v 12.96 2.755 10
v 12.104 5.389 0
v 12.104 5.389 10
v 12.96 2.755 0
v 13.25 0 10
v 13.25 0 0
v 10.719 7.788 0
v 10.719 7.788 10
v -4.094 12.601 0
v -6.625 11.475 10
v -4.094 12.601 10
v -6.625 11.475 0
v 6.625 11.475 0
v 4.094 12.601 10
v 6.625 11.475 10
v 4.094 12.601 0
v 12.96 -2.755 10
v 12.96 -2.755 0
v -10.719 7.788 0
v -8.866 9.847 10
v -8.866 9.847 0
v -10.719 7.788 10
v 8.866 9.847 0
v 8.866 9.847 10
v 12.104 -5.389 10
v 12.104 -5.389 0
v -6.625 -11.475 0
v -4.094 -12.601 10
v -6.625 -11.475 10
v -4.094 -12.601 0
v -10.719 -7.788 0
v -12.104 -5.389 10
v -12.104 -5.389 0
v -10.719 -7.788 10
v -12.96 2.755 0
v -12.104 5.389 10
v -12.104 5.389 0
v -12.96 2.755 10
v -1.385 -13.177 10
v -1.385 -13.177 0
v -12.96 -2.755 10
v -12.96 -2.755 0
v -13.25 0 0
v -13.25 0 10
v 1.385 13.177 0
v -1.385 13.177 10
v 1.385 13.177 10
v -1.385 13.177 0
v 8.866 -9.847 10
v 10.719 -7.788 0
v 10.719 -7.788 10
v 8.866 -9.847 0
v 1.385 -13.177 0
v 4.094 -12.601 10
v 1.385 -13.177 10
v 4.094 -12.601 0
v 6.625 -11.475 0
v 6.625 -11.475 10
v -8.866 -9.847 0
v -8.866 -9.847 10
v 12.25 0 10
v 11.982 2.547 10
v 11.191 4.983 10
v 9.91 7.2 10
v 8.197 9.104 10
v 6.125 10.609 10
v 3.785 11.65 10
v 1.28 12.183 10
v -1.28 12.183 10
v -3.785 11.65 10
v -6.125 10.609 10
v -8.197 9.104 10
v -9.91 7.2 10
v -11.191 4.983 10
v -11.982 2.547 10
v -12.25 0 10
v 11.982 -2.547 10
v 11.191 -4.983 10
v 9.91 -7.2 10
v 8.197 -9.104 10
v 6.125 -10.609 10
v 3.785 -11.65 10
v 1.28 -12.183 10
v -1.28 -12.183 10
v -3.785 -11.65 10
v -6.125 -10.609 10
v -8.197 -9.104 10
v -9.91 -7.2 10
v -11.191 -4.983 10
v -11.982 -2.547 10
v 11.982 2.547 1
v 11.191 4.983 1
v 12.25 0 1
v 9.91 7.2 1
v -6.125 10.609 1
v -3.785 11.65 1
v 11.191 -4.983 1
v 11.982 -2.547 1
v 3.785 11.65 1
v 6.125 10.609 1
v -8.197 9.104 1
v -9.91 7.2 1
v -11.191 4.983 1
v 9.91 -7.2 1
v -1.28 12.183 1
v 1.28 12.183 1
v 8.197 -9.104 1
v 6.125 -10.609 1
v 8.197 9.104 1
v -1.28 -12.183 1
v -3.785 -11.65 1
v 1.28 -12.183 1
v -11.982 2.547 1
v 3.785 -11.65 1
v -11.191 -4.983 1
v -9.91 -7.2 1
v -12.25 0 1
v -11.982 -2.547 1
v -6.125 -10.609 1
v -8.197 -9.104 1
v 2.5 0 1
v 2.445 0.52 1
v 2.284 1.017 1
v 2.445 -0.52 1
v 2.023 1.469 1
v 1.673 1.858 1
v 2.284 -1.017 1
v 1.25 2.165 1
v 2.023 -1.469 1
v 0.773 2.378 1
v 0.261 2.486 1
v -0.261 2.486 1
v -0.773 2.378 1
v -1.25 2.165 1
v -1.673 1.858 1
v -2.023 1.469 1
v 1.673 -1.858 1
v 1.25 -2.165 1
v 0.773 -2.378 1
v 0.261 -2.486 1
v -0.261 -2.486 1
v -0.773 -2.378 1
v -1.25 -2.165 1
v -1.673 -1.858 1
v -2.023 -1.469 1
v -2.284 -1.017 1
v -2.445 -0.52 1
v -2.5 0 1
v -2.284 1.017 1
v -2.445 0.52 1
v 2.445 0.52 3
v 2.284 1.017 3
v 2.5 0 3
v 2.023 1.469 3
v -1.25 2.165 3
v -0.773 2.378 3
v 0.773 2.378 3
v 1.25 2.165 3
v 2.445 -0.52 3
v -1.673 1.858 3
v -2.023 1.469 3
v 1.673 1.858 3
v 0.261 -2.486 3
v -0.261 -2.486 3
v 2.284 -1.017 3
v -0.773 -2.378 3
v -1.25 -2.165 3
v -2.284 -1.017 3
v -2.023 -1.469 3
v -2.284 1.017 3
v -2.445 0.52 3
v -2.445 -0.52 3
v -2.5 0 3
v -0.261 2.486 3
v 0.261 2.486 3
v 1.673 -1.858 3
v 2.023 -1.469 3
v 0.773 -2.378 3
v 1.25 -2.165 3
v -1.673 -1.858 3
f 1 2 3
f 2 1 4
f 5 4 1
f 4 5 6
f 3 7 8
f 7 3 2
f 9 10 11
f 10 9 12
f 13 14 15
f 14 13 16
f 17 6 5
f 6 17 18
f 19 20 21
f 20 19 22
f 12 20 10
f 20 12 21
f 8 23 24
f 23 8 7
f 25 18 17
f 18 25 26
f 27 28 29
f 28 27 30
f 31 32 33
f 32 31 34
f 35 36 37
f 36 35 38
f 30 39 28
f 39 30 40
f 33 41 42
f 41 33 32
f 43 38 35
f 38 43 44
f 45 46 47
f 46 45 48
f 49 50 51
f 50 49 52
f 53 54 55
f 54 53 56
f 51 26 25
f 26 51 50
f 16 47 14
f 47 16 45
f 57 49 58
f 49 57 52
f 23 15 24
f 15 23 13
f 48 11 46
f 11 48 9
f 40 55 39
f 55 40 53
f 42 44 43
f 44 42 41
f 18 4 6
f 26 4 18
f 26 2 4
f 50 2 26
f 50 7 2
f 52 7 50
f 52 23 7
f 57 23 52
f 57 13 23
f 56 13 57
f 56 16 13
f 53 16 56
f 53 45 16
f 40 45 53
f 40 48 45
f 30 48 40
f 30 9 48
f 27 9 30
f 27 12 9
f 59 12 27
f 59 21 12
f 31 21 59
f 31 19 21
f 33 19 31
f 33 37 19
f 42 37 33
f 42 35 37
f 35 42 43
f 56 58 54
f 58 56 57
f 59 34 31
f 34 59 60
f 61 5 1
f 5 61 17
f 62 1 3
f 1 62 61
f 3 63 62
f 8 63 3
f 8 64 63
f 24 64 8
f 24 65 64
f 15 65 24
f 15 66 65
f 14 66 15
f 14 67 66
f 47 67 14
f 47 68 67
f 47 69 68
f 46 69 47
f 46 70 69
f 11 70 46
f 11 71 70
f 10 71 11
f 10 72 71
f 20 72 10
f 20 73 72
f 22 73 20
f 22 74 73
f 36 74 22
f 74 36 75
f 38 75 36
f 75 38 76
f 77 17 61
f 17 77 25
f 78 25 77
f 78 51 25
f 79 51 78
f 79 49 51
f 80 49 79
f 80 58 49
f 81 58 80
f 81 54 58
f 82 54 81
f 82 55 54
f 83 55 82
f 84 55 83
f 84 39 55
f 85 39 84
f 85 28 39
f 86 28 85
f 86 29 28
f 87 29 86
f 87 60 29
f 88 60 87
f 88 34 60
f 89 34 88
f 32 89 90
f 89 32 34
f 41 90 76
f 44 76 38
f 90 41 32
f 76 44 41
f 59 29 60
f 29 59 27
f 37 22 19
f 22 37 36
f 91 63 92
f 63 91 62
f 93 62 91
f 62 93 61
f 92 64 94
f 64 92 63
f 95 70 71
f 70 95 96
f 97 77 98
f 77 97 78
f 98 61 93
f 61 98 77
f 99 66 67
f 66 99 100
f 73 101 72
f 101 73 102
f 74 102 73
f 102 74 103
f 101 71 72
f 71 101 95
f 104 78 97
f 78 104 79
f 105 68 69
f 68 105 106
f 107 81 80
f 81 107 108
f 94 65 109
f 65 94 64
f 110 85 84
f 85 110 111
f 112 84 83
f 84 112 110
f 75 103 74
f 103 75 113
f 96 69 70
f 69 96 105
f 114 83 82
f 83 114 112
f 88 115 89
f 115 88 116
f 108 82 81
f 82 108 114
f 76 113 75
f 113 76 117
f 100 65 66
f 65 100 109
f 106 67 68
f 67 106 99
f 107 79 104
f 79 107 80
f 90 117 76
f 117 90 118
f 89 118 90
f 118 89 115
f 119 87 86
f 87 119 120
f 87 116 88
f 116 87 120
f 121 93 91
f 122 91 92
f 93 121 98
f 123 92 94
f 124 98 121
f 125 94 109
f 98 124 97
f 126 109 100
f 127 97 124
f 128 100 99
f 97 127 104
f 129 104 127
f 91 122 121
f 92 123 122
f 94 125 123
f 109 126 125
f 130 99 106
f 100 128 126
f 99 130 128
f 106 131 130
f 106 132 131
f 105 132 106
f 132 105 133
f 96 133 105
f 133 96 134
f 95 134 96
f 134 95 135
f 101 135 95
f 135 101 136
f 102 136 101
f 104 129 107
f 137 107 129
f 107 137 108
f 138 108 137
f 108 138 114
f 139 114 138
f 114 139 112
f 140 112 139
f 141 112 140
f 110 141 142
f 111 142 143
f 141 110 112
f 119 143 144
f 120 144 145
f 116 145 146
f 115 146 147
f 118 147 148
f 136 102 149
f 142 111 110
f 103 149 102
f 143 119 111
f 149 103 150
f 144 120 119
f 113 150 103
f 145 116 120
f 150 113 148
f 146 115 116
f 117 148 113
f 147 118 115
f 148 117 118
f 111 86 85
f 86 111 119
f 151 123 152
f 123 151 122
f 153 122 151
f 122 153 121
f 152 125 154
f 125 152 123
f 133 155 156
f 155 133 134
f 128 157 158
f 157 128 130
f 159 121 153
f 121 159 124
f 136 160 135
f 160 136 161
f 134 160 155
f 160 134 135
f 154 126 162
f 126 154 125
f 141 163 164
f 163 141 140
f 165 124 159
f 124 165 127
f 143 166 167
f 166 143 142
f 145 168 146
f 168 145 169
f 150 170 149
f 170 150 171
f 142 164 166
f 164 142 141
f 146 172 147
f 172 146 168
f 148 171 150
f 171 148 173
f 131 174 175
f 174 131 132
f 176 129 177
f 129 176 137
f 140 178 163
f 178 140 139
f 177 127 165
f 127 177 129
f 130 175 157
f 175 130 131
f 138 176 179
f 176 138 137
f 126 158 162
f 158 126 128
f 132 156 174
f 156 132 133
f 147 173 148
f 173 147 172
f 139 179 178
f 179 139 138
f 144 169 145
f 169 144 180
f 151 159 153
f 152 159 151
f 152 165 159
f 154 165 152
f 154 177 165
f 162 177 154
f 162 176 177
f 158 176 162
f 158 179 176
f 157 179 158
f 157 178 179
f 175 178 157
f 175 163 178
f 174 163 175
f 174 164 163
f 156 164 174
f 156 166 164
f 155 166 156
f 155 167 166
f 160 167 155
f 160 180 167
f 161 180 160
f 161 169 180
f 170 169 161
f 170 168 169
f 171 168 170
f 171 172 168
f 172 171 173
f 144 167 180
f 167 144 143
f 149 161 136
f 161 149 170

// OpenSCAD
$fn=30;
module JGY_370motor(mode = "model"){
  //OTHER names: worm gear motor
  //46mm motor
  //all measurements in mm
  gearboxWidth = 46;
  gearboxHeigth = 32;
  gearboxDepth = 22.5;
  motorDiameter = 24.5;
  motorHeight = 31;
  motorCableSpace=10;
  gearboxMotorOffsetY = 18;
  gearboxMotorOffsetZ = 9.4;
  gearboxTranssionOffsetY = gearboxHeigth / 2;
  gearboxTranssionOffsetX = 15;
  
  
  translate([-gearboxTranssionOffsetX,-gearboxTranssionOffsetY,-22.5]){
    cube([gearboxWidth,gearboxHeigth,gearboxDepth]);
    translate([gearboxWidth,gearboxMotorOffsetY,gearboxMotorOffsetZ]){
      rotate([0,90,0])cylinder(d=motorDiameter,h=motorHeight+motorCableSpace);
    }
    
  }
  mountingHoles();
}

module mountingHoles(){
  //height of all mount studs
  mountStudHeight = 2;
  //transmission rod measurements
  transmissionCenterX = 9;
  transmissionCenterY = 9;
  transmissionStudMountDiameter = 13.5;
  transmissionStudDiameter = 6 + 0.5; ;//+.5 for clearance
  transmissionWedgeCutoff = 1;
  transmissionWedgeStart = 2;
  transmissionRodHeight = 14;

  union(){
    cylinder(d=transmissionStudMountDiameter,h=mountStudHeight);
    cylinder(d=transmissionStudDiameter,h=mountStudHeight+transmissionRodHeight);
  }

  translate([-transmissionCenterX,-transmissionCenterY]){
  //mountstuds
  distanceX=33;
  distanceY=18;
  screwholeThickness= 3.5;
  screwholeHeight= 10;
  mountStudDiameter = 7.5;
      
    for(point = [ [0,0], [0,distanceY], [distanceX,0], [distanceX,distanceY]])
    {
      translate(point){
        cylinder(d=mountStudDiameter,h=mountStudHeight);
        cylinder(d=screwholeThickness,h=mountStudHeight+screwholeHeight);
      }
    }
  
    //aligning Nodge
    nodgeDiameter=6.5;
    nodgeLenght = 16-nodgeDiameter;
    nodgeX = 22;
    nodgeY =  distanceY / 2-nodgeLenght/2;
    translate([nodgeX,nodgeY])
    hull(){
      cylinder(d=6.5,h=mountStudHeight);
      translate([0,nodgeLenght])cylinder(d=6.5,h=mountStudHeight);
    
    }
  }
}

module motorProtectionCap(){
 dMotor = 24.5;
 dOut = 26.5;
 dStamp = 5;
 height = 10;
 difference(){
   cylinder(d=dOut,height);
   translate([0,0,1])cylinder(d=dMotor,height);
 }
 translate([0,0,1])cylinder(d=dStamp,2);
}



//test code here
motorProtectionCap();
//rotate([180,0])
/*linear_extrude(height=.5)
projection(cut=true)
translate([0,0,25/2])
difference(){
    translate([-16,-17,-20])cube([90,34,20]);
JGY_370motor();
}*/
